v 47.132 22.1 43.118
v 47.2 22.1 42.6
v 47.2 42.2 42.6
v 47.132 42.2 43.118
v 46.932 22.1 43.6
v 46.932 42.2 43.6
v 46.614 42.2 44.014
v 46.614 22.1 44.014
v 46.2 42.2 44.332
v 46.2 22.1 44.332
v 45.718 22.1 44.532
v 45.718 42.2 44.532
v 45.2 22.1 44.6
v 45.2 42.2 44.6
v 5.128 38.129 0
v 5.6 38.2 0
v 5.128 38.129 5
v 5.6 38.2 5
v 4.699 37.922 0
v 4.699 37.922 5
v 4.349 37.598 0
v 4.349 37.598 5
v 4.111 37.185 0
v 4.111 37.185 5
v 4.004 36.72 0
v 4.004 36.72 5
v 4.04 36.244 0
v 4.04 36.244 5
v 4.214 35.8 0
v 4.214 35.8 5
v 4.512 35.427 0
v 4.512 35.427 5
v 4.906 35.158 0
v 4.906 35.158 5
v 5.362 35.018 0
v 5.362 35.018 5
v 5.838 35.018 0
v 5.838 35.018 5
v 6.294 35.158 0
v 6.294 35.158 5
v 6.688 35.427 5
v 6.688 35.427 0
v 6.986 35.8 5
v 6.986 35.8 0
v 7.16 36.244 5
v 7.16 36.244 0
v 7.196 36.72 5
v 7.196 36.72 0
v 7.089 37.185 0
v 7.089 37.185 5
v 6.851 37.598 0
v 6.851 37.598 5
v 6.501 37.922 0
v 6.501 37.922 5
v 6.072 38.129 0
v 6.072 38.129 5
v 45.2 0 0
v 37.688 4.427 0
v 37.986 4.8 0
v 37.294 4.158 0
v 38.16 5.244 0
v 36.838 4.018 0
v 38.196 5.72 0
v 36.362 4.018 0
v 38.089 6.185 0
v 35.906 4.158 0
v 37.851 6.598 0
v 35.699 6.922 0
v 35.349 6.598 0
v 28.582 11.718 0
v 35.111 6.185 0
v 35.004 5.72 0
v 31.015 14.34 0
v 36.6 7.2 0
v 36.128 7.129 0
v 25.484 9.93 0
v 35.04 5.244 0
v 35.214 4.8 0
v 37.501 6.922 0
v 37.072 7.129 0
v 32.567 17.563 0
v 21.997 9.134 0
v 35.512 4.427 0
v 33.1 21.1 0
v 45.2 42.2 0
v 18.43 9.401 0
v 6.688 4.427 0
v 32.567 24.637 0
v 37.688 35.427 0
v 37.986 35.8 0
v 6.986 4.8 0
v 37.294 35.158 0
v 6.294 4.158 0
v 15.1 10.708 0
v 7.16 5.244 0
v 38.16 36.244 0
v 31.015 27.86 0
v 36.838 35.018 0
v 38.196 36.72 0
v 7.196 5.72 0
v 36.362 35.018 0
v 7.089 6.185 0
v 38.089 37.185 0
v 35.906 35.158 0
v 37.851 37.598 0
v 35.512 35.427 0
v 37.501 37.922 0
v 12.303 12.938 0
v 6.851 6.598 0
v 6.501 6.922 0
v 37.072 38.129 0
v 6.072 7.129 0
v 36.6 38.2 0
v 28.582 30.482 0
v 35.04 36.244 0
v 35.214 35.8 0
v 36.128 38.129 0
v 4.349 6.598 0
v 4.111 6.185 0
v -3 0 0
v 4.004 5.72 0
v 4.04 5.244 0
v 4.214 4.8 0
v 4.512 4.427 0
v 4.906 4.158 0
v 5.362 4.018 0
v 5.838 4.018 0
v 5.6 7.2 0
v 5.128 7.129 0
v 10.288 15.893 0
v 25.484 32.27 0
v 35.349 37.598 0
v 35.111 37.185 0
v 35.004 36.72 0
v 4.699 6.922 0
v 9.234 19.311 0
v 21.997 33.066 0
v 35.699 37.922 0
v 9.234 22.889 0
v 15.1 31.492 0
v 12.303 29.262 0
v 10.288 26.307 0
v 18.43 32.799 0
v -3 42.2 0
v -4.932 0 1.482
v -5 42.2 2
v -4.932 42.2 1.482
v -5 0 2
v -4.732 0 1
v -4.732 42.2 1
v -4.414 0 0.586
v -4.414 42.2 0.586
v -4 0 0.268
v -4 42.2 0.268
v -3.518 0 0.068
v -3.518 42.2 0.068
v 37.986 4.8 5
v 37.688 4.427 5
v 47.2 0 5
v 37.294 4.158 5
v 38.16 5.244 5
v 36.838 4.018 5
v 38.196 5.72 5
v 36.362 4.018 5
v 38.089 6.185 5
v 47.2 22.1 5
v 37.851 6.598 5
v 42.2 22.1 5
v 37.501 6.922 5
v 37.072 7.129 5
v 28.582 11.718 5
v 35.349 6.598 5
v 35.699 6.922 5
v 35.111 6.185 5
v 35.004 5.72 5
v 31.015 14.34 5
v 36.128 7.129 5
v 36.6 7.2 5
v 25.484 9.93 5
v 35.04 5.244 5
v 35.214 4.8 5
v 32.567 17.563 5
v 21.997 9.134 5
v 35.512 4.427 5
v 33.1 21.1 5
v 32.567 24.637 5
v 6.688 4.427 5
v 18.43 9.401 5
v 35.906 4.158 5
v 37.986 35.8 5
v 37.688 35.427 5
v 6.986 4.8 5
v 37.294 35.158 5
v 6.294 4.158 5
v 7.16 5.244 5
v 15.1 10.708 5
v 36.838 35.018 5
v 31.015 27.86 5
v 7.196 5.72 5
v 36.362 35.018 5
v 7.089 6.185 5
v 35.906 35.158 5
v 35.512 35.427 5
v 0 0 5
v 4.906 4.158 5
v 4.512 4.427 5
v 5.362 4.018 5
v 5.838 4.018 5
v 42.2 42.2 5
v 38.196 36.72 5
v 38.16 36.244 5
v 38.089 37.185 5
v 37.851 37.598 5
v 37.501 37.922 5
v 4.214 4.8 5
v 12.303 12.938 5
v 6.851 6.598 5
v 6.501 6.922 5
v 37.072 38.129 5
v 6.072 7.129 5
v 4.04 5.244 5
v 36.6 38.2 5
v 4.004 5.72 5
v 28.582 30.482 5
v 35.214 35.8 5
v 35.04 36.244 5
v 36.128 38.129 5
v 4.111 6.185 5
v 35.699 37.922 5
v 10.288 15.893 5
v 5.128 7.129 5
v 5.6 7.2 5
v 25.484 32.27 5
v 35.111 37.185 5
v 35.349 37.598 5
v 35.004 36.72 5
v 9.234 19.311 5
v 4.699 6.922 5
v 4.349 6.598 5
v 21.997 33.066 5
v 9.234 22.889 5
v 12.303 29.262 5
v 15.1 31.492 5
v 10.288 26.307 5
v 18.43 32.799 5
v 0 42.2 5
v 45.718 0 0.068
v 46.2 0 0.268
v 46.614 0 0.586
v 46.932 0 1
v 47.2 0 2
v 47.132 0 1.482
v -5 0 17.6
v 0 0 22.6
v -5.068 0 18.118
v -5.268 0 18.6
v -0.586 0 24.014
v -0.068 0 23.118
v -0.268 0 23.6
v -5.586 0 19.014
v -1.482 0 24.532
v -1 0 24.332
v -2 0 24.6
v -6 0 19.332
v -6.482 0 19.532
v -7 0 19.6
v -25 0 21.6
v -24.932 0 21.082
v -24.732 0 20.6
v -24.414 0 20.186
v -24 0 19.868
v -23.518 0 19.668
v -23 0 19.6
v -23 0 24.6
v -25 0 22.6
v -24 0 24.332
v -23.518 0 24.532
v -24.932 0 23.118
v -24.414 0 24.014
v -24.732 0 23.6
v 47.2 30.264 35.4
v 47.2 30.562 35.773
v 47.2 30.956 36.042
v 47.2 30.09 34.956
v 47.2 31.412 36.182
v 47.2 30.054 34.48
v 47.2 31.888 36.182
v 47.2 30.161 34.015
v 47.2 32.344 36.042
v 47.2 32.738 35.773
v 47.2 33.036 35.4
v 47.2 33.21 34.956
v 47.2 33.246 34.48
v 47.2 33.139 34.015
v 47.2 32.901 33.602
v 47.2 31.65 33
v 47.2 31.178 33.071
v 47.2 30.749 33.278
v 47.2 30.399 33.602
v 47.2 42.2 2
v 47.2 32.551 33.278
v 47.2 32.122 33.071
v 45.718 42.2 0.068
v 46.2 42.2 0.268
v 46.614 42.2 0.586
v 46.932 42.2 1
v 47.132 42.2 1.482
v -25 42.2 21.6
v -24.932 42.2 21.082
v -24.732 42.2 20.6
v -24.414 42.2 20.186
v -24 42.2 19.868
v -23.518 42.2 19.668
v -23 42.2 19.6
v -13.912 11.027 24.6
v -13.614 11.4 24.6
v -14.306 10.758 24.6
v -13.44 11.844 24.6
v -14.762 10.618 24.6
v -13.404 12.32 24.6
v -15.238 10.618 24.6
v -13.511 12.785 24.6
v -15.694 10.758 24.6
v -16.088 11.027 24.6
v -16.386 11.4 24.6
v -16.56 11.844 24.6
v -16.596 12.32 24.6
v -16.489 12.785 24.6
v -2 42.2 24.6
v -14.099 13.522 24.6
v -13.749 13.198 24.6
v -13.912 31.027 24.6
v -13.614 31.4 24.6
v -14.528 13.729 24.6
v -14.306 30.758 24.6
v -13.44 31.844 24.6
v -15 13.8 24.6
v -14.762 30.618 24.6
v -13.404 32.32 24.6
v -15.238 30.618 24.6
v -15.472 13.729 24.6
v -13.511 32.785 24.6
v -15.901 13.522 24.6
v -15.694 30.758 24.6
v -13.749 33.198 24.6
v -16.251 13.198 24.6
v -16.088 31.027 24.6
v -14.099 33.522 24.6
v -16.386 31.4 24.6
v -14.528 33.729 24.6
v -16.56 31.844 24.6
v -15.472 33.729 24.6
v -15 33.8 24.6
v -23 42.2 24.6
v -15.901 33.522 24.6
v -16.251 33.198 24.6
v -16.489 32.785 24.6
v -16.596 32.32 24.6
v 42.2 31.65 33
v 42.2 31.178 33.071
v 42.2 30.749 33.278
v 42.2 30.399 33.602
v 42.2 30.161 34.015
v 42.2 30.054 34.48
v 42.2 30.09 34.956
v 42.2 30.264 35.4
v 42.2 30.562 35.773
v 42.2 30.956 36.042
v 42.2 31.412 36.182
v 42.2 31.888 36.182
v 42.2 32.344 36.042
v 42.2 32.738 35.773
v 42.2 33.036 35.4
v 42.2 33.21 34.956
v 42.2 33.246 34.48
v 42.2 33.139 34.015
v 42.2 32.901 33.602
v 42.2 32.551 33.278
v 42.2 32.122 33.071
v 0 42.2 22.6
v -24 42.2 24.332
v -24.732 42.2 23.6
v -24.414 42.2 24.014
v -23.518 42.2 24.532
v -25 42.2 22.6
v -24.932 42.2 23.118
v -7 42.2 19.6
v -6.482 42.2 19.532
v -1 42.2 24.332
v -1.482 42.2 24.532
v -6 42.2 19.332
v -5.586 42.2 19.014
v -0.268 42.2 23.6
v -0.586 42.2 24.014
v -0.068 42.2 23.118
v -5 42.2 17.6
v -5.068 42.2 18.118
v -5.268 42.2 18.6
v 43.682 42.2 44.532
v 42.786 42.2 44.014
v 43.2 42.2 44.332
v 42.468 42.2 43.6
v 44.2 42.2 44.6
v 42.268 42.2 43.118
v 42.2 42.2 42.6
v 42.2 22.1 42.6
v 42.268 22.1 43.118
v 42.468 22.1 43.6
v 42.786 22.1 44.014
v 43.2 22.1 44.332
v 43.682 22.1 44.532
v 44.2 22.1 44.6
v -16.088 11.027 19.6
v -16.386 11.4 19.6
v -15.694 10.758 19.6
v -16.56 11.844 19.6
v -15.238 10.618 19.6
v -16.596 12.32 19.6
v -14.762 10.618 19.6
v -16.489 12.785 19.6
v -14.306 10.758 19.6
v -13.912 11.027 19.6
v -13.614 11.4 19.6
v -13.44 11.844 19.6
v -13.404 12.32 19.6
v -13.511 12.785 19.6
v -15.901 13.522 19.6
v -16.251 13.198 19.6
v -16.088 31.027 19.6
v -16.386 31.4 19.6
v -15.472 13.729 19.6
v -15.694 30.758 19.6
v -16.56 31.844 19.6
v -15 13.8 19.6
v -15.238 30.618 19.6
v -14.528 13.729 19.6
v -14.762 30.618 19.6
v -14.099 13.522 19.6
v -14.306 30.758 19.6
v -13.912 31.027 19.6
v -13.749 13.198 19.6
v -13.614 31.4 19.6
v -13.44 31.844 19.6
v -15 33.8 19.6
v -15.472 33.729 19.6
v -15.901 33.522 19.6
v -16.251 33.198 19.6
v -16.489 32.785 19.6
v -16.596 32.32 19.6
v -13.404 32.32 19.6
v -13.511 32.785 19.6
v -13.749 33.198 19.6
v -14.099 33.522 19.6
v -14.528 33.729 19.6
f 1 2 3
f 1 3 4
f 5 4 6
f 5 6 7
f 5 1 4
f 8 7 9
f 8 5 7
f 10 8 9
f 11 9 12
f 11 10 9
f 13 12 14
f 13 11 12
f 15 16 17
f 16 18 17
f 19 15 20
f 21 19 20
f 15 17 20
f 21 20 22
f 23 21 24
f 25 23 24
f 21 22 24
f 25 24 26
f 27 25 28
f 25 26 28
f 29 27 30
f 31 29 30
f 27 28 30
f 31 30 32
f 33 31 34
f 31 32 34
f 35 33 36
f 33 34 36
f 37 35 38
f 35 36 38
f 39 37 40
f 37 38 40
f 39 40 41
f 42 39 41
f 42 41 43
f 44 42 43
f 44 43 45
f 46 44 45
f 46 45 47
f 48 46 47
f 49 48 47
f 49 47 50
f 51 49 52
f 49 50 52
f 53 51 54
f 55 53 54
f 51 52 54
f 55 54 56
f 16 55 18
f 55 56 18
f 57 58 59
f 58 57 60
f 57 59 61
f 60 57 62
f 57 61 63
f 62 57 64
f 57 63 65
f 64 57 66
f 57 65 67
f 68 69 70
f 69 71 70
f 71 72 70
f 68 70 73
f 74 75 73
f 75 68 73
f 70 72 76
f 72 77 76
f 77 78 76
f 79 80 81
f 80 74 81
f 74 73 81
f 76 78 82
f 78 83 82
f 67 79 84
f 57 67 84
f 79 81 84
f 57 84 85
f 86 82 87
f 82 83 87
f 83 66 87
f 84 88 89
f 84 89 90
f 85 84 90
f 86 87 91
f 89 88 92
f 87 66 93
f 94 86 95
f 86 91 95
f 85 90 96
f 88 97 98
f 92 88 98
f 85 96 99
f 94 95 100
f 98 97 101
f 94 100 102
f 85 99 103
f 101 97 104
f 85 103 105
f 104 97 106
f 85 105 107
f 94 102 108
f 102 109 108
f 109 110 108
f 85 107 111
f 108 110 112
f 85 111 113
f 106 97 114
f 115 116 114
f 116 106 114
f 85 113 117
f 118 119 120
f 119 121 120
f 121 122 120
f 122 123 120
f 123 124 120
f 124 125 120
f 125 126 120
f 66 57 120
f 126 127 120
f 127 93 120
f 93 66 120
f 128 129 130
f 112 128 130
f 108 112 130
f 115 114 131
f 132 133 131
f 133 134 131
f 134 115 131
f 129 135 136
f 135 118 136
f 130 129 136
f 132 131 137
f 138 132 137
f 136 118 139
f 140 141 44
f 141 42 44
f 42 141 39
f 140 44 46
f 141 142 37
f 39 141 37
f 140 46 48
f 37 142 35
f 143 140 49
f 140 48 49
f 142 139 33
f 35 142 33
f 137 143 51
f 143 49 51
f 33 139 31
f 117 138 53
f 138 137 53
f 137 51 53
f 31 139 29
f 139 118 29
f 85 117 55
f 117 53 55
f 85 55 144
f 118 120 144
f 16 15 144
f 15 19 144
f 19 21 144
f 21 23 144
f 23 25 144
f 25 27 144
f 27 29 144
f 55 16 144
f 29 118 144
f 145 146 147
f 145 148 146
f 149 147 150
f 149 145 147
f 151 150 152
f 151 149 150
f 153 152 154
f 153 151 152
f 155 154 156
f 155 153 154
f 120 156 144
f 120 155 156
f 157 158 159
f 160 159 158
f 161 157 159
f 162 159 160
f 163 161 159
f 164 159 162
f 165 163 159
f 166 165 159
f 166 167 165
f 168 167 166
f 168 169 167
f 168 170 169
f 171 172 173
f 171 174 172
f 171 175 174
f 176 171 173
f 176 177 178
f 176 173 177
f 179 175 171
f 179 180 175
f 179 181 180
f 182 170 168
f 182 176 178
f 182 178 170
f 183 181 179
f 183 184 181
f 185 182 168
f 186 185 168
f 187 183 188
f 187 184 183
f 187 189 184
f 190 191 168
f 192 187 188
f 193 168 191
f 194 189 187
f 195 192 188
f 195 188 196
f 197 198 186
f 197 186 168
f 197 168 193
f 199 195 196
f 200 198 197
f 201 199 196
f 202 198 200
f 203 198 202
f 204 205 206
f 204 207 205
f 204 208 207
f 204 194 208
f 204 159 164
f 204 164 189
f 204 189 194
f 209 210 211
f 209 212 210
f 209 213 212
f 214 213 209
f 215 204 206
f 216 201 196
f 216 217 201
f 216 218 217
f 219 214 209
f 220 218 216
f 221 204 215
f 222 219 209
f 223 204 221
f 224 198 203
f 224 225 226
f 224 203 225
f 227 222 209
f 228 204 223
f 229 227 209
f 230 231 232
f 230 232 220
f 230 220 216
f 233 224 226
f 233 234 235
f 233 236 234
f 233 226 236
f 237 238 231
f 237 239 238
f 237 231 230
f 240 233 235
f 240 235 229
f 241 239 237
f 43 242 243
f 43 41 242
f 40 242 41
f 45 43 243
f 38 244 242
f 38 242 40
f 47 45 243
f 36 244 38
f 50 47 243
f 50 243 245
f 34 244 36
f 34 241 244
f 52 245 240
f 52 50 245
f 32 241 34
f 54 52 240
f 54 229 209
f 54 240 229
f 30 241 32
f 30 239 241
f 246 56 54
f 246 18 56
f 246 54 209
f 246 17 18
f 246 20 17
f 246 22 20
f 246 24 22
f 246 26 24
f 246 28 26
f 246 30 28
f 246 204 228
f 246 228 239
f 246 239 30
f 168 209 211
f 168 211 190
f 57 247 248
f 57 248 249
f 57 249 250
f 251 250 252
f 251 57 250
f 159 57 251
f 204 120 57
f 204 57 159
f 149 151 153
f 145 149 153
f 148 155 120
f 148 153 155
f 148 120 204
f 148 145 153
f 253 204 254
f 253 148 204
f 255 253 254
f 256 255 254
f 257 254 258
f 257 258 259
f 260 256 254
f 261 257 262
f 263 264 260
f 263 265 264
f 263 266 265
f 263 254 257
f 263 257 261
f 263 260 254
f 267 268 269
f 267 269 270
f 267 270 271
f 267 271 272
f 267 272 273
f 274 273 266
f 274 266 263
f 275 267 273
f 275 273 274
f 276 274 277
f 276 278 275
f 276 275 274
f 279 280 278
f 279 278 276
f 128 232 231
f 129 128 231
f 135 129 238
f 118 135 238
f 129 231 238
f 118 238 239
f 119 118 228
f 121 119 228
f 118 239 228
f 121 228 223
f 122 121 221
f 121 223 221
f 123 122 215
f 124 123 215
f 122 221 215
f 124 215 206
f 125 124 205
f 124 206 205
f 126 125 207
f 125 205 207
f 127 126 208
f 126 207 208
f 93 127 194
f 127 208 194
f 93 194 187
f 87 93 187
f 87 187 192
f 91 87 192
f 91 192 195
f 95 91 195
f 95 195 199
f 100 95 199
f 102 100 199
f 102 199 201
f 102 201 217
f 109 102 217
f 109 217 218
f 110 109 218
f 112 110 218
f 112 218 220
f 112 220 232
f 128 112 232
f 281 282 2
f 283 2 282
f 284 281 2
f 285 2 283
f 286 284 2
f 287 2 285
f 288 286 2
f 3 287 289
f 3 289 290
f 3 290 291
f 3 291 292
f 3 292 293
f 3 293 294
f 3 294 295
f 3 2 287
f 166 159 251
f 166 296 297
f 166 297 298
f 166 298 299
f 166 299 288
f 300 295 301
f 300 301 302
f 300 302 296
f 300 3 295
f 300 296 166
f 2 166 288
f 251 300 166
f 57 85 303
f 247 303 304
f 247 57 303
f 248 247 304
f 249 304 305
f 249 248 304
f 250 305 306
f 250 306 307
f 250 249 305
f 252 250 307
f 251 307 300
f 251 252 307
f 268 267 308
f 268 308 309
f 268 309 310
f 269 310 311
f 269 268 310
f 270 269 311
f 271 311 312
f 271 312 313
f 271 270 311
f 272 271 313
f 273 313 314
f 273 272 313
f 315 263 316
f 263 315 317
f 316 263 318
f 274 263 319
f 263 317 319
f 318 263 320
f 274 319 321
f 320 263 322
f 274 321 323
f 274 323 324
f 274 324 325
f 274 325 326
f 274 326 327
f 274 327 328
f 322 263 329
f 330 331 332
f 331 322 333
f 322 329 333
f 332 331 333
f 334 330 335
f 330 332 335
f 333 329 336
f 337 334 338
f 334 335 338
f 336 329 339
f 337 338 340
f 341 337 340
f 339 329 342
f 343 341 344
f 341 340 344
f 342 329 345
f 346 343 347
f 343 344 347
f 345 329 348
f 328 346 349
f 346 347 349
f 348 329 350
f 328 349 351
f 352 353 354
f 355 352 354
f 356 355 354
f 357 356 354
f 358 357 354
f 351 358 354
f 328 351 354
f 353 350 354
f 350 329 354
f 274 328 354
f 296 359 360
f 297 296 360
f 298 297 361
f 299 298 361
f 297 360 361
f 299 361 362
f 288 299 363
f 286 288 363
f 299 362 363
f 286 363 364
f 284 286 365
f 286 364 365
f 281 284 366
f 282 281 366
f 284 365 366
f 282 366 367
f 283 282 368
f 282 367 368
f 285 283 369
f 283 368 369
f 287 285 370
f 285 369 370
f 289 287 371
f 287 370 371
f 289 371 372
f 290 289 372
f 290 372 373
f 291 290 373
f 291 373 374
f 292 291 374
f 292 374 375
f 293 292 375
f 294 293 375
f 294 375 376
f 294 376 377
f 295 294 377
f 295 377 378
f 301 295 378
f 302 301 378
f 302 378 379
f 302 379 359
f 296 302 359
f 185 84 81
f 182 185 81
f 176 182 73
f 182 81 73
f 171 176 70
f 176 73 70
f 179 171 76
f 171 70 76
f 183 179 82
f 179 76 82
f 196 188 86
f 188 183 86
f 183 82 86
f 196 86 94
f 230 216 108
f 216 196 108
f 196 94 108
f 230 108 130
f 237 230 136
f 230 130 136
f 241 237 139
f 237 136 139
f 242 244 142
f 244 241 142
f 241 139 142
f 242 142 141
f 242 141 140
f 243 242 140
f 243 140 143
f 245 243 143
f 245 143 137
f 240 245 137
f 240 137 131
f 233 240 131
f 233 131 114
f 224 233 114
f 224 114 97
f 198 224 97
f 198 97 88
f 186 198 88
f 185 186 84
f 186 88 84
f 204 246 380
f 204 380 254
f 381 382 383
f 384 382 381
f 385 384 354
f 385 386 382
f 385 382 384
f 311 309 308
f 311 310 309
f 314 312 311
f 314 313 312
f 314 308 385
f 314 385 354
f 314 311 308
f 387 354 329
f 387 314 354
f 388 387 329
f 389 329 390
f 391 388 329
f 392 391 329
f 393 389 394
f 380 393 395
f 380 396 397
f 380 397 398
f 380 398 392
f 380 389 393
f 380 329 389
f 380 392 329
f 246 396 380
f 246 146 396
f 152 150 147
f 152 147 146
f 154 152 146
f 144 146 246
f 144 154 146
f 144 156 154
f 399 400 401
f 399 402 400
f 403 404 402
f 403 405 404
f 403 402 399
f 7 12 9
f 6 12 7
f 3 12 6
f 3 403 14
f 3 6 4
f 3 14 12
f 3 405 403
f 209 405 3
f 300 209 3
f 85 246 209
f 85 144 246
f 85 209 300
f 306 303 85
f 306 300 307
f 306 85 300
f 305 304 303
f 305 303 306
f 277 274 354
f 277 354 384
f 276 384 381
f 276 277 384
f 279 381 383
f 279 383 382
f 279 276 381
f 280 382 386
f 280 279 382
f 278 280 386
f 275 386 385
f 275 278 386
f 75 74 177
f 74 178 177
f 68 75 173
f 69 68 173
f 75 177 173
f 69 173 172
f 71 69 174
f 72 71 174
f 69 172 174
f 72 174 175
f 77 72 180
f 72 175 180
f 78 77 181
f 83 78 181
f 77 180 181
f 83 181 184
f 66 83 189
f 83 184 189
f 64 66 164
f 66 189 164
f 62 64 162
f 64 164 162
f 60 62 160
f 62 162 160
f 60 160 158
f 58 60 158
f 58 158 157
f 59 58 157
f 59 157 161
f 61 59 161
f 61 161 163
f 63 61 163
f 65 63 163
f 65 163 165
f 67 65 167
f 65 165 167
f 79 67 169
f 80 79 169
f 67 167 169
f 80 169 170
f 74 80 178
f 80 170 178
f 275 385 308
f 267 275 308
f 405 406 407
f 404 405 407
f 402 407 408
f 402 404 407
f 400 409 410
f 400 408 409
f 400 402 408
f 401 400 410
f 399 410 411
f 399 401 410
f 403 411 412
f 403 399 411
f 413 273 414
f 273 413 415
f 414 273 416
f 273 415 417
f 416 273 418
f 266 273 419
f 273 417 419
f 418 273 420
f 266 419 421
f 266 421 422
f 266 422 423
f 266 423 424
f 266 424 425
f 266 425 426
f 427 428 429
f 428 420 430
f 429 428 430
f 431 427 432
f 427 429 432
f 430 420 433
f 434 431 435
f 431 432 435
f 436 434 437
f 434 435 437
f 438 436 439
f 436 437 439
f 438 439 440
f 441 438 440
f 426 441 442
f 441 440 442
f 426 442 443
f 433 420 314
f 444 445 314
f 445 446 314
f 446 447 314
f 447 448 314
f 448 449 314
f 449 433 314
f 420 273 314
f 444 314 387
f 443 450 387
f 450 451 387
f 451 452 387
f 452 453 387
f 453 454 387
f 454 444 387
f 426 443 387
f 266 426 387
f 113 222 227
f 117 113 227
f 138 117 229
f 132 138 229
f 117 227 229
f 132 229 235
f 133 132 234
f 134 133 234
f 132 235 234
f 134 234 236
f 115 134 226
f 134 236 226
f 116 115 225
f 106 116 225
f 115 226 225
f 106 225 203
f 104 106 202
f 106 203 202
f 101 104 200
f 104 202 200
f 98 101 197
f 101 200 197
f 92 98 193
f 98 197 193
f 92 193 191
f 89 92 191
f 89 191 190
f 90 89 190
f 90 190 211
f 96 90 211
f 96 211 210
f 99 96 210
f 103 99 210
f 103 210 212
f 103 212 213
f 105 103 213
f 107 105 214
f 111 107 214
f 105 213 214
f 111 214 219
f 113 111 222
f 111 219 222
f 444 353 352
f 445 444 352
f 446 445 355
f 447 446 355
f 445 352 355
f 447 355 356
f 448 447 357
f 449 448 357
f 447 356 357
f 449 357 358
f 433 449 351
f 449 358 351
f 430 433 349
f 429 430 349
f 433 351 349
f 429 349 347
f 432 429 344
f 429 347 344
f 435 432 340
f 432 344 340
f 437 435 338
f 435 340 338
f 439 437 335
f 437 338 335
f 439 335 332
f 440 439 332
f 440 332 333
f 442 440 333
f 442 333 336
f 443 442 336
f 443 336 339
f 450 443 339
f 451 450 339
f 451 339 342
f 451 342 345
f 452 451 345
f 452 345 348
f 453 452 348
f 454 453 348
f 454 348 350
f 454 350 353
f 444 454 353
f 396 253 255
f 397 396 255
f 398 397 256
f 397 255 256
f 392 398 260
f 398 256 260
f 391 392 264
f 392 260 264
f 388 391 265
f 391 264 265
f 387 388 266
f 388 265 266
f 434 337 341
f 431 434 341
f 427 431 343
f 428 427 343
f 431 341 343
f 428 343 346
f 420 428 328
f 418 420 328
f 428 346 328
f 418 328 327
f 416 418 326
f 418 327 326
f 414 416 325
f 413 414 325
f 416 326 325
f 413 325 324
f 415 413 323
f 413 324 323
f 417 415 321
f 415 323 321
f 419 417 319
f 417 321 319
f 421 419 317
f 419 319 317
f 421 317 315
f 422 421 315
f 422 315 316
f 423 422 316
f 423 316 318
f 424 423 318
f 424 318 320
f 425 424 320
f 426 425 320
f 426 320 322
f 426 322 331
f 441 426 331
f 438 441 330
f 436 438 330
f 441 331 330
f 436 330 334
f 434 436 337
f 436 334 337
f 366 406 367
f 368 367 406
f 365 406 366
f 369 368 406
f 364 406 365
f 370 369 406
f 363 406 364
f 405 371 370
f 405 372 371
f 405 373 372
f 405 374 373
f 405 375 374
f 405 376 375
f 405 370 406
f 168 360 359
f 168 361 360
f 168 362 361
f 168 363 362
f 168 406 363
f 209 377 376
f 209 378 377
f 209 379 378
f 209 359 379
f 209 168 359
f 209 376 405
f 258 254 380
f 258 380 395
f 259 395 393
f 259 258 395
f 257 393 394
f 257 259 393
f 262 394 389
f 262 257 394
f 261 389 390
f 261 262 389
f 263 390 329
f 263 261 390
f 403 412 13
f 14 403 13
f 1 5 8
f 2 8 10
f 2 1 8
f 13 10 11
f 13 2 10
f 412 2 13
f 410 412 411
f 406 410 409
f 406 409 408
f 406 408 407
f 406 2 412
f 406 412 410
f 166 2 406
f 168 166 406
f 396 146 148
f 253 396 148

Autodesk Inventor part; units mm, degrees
ref_plane "YZ Plane" through (0, 0, 0) normal (1, 0, 0) x (0, 1, 0)
ref_plane "XZ Plane" through (0, 0, 0) normal (0, 1, 0) x (-1, 0, 0)
ref_plane "XY Plane" through (0, 0, 0) normal (0, 0, 1) x (1, 0, 0)
sketch "Sketch1" plane through (0, 0, 0) normal (0, 0, 1) x (1, 0, 0)
  line L0 (0, 0) -> (42.2, 0)
  line L1 (42.2, 0) -> (42.2, 42.2)
  line L2 (42.2, 42.2) -> (0, 42.2)
  line L3 (0, 42.2) -> (0, 0)
  line L4 (0, 0) -> (5, 0)
  line L5 (42.2, 0) -> (45, 0)
  line L6 (5.6, 36.6) -> (36.6, 36.6) construction
  line L7 (36.6, 36.6) -> (36.6, 5.6) construction
  line L8 (36.6, 5.6) -> (5.6, 5.6) construction
  line L9 (5.6, 5.6) -> (5.6, 36.6) construction
  circle A0 centre (21.1, 21.1) radius 12
  line L10 (0.1, 42.1) -> (42.1, 42.1)
  line L11 (42.1, 42.1) -> (42.1, 0.1)
  line L12 (42.1, 0.1) -> (0.1, 0.1)
  line L13 (0.1, 0.1) -> (0.1, 42.1)
  line L14 (42.2, 42.2) -> (47.2, 42.2)
  line L15 (47.2, 42.2) -> (47.2, 21.1)
  line L16 (47.2, 21.1) -> (42.2, 21.1)
  line L17 (42.2, 21.1) -> (42.2, 42.2)
  line L18 (0, 42.2) -> (-5, 42.2)
  line L19 (-5, 42.2) -> (-5, 0)
  line L20 (-5, 0) -> (0, 0)
  line L21 (0, 0) -> (0, 42.2)
  point P0 (36.6, 21.1)
  point P1 (42.1, 21.1)
  point P2 (21.1, 36.6)
  point P3 (21.1, 42.1)
  point P4 (21.1, 42.2)
  dimension "d0" = 31
  dimension "d1" = 42
  dimension "d5" = 0.1
  dimension "d6" = 0.1
  dimension "d7" = 24
  dimension "d32" = 5
  dimension "d37" = 5
extrude "Extrusion2" add sketch "Sketch1" along normal blind 5 contours L3 L2 L1 L0 | L10 L11 L12 L13
extrude "Extrusion4" add sketch "Sketch1" along normal blind 44.6 contours L14 L15 L16 L1
extrude "Extrusion5" add sketch "Sketch1" along normal blind 24.6 contours L20 L19 L18 L3
hole "Hole1" at (5.6, 36.6, 0) at (36.6, 36.6, 0) at (36.6, 5.6, 0) at (5.6, 5.6, 0) direction (0, 0, 1) diameter 3.2 end through all
sketch "Sketch4" plane through (42.2, 42.2, 44.6) normal (0, 1, 0) x (1, 0, 0)
  line L0 (-47.2, 20) -> (-67.2, 20)
  line L1 (-67.2, 20) -> (-67.2, 25)
  line L2 (-67.2, 25) -> (-47.2, 25)
  line L3 (-47.2, 25) -> (-47.2, 20)
  point P0 (-42.2, 44.6)
  dimension "d42" = 20
  dimension "d43" = 5
extrude "Extrusion6" add sketch "Sketch4" against normal up to surface (42.2 mm away)
sketch "Sketch5" plane through (47.2, 21.1, 44.6) normal (1, 0, 0) x (0, 0, -1)
  line L0 (0, 0) -> (0, 21.1) projected
  line L1 (44.6, 21.1) -> (0, 21.1) projected
  line L2 (44.6, 0) -> (0, 0) projected
  point P0 (44.6, -21.1)
  point P1 (10, 10.55)
  point P2 (49.6, 26)
  point P3 (49.6, 0)
  dimension "d46" = 10
  dimension "d47" = 10.55
  dimension "d48" = 10.55
sketch "Sketch6" plane through (-5, 42.2, 19.6) normal (0, 0, -1) x (-1, 0, 0)
  line L0 (0, -42.2) -> (20, -42.2) projected
  line L1 (20, 0) -> (20, -42.2) projected
  line L2 (0, 0) -> (20, 0) projected
  line L3 (0, -42.2) -> (0, 0) projected
  point P0 (-5, -42.2)
  point P1 (10, -10)
  point P2 (10, -30)
  point P3 (10, -42.2)
  point P4 (10, 0)
  dimension "d49" = 10
  dimension "d65" = 20
hole "Hole3" at (-15, 32.2, 19.6) at (-15, 12.2, 19.6) direction (0, 0, 1) diameter 3.2 end through all
hole "Hole4" at (47.2, 31.65, 34.6) direction (-1, 0, 0) diameter 3.2 end through all
sketch "Sketch7" plane through (42.2, 0, 5) normal (1, 0, 0) x (0, 0, -1)
  line L0 (5, 21.1) -> (0, 21.1) projected
  line L1 (0, 0) -> (0, 21.1) projected
  line L2 (5, 0) -> (0, 0) projected
  line L3 (5, 0) -> (5, 21.1) projected
  point P0 (5, 0)
extrude "Extrusion7" add sketch "Sketch7" along normal blind 5
thicken "Thicken2" operation cut thickness 1 both sides no extend neighbours no toward (0, 1, 0) faces at (45.5333, 21.1, 18.2)
fillet "Fillet1" radius 2 8 edges at (0, 21.1, 24.6) (-25, 21.1, 24.6) (-25, 21.1, 19.6) (-5, 21.1, 19.6) (-5, 21.1, 0) (47.2, 21.1, 0) (42.2, 32.15, 44.6) (47.2, 32.15, 44.6)
equation "\"d6\" = d5"
equation "\"d47\" = d48"
properties part number "Motor Mount"
